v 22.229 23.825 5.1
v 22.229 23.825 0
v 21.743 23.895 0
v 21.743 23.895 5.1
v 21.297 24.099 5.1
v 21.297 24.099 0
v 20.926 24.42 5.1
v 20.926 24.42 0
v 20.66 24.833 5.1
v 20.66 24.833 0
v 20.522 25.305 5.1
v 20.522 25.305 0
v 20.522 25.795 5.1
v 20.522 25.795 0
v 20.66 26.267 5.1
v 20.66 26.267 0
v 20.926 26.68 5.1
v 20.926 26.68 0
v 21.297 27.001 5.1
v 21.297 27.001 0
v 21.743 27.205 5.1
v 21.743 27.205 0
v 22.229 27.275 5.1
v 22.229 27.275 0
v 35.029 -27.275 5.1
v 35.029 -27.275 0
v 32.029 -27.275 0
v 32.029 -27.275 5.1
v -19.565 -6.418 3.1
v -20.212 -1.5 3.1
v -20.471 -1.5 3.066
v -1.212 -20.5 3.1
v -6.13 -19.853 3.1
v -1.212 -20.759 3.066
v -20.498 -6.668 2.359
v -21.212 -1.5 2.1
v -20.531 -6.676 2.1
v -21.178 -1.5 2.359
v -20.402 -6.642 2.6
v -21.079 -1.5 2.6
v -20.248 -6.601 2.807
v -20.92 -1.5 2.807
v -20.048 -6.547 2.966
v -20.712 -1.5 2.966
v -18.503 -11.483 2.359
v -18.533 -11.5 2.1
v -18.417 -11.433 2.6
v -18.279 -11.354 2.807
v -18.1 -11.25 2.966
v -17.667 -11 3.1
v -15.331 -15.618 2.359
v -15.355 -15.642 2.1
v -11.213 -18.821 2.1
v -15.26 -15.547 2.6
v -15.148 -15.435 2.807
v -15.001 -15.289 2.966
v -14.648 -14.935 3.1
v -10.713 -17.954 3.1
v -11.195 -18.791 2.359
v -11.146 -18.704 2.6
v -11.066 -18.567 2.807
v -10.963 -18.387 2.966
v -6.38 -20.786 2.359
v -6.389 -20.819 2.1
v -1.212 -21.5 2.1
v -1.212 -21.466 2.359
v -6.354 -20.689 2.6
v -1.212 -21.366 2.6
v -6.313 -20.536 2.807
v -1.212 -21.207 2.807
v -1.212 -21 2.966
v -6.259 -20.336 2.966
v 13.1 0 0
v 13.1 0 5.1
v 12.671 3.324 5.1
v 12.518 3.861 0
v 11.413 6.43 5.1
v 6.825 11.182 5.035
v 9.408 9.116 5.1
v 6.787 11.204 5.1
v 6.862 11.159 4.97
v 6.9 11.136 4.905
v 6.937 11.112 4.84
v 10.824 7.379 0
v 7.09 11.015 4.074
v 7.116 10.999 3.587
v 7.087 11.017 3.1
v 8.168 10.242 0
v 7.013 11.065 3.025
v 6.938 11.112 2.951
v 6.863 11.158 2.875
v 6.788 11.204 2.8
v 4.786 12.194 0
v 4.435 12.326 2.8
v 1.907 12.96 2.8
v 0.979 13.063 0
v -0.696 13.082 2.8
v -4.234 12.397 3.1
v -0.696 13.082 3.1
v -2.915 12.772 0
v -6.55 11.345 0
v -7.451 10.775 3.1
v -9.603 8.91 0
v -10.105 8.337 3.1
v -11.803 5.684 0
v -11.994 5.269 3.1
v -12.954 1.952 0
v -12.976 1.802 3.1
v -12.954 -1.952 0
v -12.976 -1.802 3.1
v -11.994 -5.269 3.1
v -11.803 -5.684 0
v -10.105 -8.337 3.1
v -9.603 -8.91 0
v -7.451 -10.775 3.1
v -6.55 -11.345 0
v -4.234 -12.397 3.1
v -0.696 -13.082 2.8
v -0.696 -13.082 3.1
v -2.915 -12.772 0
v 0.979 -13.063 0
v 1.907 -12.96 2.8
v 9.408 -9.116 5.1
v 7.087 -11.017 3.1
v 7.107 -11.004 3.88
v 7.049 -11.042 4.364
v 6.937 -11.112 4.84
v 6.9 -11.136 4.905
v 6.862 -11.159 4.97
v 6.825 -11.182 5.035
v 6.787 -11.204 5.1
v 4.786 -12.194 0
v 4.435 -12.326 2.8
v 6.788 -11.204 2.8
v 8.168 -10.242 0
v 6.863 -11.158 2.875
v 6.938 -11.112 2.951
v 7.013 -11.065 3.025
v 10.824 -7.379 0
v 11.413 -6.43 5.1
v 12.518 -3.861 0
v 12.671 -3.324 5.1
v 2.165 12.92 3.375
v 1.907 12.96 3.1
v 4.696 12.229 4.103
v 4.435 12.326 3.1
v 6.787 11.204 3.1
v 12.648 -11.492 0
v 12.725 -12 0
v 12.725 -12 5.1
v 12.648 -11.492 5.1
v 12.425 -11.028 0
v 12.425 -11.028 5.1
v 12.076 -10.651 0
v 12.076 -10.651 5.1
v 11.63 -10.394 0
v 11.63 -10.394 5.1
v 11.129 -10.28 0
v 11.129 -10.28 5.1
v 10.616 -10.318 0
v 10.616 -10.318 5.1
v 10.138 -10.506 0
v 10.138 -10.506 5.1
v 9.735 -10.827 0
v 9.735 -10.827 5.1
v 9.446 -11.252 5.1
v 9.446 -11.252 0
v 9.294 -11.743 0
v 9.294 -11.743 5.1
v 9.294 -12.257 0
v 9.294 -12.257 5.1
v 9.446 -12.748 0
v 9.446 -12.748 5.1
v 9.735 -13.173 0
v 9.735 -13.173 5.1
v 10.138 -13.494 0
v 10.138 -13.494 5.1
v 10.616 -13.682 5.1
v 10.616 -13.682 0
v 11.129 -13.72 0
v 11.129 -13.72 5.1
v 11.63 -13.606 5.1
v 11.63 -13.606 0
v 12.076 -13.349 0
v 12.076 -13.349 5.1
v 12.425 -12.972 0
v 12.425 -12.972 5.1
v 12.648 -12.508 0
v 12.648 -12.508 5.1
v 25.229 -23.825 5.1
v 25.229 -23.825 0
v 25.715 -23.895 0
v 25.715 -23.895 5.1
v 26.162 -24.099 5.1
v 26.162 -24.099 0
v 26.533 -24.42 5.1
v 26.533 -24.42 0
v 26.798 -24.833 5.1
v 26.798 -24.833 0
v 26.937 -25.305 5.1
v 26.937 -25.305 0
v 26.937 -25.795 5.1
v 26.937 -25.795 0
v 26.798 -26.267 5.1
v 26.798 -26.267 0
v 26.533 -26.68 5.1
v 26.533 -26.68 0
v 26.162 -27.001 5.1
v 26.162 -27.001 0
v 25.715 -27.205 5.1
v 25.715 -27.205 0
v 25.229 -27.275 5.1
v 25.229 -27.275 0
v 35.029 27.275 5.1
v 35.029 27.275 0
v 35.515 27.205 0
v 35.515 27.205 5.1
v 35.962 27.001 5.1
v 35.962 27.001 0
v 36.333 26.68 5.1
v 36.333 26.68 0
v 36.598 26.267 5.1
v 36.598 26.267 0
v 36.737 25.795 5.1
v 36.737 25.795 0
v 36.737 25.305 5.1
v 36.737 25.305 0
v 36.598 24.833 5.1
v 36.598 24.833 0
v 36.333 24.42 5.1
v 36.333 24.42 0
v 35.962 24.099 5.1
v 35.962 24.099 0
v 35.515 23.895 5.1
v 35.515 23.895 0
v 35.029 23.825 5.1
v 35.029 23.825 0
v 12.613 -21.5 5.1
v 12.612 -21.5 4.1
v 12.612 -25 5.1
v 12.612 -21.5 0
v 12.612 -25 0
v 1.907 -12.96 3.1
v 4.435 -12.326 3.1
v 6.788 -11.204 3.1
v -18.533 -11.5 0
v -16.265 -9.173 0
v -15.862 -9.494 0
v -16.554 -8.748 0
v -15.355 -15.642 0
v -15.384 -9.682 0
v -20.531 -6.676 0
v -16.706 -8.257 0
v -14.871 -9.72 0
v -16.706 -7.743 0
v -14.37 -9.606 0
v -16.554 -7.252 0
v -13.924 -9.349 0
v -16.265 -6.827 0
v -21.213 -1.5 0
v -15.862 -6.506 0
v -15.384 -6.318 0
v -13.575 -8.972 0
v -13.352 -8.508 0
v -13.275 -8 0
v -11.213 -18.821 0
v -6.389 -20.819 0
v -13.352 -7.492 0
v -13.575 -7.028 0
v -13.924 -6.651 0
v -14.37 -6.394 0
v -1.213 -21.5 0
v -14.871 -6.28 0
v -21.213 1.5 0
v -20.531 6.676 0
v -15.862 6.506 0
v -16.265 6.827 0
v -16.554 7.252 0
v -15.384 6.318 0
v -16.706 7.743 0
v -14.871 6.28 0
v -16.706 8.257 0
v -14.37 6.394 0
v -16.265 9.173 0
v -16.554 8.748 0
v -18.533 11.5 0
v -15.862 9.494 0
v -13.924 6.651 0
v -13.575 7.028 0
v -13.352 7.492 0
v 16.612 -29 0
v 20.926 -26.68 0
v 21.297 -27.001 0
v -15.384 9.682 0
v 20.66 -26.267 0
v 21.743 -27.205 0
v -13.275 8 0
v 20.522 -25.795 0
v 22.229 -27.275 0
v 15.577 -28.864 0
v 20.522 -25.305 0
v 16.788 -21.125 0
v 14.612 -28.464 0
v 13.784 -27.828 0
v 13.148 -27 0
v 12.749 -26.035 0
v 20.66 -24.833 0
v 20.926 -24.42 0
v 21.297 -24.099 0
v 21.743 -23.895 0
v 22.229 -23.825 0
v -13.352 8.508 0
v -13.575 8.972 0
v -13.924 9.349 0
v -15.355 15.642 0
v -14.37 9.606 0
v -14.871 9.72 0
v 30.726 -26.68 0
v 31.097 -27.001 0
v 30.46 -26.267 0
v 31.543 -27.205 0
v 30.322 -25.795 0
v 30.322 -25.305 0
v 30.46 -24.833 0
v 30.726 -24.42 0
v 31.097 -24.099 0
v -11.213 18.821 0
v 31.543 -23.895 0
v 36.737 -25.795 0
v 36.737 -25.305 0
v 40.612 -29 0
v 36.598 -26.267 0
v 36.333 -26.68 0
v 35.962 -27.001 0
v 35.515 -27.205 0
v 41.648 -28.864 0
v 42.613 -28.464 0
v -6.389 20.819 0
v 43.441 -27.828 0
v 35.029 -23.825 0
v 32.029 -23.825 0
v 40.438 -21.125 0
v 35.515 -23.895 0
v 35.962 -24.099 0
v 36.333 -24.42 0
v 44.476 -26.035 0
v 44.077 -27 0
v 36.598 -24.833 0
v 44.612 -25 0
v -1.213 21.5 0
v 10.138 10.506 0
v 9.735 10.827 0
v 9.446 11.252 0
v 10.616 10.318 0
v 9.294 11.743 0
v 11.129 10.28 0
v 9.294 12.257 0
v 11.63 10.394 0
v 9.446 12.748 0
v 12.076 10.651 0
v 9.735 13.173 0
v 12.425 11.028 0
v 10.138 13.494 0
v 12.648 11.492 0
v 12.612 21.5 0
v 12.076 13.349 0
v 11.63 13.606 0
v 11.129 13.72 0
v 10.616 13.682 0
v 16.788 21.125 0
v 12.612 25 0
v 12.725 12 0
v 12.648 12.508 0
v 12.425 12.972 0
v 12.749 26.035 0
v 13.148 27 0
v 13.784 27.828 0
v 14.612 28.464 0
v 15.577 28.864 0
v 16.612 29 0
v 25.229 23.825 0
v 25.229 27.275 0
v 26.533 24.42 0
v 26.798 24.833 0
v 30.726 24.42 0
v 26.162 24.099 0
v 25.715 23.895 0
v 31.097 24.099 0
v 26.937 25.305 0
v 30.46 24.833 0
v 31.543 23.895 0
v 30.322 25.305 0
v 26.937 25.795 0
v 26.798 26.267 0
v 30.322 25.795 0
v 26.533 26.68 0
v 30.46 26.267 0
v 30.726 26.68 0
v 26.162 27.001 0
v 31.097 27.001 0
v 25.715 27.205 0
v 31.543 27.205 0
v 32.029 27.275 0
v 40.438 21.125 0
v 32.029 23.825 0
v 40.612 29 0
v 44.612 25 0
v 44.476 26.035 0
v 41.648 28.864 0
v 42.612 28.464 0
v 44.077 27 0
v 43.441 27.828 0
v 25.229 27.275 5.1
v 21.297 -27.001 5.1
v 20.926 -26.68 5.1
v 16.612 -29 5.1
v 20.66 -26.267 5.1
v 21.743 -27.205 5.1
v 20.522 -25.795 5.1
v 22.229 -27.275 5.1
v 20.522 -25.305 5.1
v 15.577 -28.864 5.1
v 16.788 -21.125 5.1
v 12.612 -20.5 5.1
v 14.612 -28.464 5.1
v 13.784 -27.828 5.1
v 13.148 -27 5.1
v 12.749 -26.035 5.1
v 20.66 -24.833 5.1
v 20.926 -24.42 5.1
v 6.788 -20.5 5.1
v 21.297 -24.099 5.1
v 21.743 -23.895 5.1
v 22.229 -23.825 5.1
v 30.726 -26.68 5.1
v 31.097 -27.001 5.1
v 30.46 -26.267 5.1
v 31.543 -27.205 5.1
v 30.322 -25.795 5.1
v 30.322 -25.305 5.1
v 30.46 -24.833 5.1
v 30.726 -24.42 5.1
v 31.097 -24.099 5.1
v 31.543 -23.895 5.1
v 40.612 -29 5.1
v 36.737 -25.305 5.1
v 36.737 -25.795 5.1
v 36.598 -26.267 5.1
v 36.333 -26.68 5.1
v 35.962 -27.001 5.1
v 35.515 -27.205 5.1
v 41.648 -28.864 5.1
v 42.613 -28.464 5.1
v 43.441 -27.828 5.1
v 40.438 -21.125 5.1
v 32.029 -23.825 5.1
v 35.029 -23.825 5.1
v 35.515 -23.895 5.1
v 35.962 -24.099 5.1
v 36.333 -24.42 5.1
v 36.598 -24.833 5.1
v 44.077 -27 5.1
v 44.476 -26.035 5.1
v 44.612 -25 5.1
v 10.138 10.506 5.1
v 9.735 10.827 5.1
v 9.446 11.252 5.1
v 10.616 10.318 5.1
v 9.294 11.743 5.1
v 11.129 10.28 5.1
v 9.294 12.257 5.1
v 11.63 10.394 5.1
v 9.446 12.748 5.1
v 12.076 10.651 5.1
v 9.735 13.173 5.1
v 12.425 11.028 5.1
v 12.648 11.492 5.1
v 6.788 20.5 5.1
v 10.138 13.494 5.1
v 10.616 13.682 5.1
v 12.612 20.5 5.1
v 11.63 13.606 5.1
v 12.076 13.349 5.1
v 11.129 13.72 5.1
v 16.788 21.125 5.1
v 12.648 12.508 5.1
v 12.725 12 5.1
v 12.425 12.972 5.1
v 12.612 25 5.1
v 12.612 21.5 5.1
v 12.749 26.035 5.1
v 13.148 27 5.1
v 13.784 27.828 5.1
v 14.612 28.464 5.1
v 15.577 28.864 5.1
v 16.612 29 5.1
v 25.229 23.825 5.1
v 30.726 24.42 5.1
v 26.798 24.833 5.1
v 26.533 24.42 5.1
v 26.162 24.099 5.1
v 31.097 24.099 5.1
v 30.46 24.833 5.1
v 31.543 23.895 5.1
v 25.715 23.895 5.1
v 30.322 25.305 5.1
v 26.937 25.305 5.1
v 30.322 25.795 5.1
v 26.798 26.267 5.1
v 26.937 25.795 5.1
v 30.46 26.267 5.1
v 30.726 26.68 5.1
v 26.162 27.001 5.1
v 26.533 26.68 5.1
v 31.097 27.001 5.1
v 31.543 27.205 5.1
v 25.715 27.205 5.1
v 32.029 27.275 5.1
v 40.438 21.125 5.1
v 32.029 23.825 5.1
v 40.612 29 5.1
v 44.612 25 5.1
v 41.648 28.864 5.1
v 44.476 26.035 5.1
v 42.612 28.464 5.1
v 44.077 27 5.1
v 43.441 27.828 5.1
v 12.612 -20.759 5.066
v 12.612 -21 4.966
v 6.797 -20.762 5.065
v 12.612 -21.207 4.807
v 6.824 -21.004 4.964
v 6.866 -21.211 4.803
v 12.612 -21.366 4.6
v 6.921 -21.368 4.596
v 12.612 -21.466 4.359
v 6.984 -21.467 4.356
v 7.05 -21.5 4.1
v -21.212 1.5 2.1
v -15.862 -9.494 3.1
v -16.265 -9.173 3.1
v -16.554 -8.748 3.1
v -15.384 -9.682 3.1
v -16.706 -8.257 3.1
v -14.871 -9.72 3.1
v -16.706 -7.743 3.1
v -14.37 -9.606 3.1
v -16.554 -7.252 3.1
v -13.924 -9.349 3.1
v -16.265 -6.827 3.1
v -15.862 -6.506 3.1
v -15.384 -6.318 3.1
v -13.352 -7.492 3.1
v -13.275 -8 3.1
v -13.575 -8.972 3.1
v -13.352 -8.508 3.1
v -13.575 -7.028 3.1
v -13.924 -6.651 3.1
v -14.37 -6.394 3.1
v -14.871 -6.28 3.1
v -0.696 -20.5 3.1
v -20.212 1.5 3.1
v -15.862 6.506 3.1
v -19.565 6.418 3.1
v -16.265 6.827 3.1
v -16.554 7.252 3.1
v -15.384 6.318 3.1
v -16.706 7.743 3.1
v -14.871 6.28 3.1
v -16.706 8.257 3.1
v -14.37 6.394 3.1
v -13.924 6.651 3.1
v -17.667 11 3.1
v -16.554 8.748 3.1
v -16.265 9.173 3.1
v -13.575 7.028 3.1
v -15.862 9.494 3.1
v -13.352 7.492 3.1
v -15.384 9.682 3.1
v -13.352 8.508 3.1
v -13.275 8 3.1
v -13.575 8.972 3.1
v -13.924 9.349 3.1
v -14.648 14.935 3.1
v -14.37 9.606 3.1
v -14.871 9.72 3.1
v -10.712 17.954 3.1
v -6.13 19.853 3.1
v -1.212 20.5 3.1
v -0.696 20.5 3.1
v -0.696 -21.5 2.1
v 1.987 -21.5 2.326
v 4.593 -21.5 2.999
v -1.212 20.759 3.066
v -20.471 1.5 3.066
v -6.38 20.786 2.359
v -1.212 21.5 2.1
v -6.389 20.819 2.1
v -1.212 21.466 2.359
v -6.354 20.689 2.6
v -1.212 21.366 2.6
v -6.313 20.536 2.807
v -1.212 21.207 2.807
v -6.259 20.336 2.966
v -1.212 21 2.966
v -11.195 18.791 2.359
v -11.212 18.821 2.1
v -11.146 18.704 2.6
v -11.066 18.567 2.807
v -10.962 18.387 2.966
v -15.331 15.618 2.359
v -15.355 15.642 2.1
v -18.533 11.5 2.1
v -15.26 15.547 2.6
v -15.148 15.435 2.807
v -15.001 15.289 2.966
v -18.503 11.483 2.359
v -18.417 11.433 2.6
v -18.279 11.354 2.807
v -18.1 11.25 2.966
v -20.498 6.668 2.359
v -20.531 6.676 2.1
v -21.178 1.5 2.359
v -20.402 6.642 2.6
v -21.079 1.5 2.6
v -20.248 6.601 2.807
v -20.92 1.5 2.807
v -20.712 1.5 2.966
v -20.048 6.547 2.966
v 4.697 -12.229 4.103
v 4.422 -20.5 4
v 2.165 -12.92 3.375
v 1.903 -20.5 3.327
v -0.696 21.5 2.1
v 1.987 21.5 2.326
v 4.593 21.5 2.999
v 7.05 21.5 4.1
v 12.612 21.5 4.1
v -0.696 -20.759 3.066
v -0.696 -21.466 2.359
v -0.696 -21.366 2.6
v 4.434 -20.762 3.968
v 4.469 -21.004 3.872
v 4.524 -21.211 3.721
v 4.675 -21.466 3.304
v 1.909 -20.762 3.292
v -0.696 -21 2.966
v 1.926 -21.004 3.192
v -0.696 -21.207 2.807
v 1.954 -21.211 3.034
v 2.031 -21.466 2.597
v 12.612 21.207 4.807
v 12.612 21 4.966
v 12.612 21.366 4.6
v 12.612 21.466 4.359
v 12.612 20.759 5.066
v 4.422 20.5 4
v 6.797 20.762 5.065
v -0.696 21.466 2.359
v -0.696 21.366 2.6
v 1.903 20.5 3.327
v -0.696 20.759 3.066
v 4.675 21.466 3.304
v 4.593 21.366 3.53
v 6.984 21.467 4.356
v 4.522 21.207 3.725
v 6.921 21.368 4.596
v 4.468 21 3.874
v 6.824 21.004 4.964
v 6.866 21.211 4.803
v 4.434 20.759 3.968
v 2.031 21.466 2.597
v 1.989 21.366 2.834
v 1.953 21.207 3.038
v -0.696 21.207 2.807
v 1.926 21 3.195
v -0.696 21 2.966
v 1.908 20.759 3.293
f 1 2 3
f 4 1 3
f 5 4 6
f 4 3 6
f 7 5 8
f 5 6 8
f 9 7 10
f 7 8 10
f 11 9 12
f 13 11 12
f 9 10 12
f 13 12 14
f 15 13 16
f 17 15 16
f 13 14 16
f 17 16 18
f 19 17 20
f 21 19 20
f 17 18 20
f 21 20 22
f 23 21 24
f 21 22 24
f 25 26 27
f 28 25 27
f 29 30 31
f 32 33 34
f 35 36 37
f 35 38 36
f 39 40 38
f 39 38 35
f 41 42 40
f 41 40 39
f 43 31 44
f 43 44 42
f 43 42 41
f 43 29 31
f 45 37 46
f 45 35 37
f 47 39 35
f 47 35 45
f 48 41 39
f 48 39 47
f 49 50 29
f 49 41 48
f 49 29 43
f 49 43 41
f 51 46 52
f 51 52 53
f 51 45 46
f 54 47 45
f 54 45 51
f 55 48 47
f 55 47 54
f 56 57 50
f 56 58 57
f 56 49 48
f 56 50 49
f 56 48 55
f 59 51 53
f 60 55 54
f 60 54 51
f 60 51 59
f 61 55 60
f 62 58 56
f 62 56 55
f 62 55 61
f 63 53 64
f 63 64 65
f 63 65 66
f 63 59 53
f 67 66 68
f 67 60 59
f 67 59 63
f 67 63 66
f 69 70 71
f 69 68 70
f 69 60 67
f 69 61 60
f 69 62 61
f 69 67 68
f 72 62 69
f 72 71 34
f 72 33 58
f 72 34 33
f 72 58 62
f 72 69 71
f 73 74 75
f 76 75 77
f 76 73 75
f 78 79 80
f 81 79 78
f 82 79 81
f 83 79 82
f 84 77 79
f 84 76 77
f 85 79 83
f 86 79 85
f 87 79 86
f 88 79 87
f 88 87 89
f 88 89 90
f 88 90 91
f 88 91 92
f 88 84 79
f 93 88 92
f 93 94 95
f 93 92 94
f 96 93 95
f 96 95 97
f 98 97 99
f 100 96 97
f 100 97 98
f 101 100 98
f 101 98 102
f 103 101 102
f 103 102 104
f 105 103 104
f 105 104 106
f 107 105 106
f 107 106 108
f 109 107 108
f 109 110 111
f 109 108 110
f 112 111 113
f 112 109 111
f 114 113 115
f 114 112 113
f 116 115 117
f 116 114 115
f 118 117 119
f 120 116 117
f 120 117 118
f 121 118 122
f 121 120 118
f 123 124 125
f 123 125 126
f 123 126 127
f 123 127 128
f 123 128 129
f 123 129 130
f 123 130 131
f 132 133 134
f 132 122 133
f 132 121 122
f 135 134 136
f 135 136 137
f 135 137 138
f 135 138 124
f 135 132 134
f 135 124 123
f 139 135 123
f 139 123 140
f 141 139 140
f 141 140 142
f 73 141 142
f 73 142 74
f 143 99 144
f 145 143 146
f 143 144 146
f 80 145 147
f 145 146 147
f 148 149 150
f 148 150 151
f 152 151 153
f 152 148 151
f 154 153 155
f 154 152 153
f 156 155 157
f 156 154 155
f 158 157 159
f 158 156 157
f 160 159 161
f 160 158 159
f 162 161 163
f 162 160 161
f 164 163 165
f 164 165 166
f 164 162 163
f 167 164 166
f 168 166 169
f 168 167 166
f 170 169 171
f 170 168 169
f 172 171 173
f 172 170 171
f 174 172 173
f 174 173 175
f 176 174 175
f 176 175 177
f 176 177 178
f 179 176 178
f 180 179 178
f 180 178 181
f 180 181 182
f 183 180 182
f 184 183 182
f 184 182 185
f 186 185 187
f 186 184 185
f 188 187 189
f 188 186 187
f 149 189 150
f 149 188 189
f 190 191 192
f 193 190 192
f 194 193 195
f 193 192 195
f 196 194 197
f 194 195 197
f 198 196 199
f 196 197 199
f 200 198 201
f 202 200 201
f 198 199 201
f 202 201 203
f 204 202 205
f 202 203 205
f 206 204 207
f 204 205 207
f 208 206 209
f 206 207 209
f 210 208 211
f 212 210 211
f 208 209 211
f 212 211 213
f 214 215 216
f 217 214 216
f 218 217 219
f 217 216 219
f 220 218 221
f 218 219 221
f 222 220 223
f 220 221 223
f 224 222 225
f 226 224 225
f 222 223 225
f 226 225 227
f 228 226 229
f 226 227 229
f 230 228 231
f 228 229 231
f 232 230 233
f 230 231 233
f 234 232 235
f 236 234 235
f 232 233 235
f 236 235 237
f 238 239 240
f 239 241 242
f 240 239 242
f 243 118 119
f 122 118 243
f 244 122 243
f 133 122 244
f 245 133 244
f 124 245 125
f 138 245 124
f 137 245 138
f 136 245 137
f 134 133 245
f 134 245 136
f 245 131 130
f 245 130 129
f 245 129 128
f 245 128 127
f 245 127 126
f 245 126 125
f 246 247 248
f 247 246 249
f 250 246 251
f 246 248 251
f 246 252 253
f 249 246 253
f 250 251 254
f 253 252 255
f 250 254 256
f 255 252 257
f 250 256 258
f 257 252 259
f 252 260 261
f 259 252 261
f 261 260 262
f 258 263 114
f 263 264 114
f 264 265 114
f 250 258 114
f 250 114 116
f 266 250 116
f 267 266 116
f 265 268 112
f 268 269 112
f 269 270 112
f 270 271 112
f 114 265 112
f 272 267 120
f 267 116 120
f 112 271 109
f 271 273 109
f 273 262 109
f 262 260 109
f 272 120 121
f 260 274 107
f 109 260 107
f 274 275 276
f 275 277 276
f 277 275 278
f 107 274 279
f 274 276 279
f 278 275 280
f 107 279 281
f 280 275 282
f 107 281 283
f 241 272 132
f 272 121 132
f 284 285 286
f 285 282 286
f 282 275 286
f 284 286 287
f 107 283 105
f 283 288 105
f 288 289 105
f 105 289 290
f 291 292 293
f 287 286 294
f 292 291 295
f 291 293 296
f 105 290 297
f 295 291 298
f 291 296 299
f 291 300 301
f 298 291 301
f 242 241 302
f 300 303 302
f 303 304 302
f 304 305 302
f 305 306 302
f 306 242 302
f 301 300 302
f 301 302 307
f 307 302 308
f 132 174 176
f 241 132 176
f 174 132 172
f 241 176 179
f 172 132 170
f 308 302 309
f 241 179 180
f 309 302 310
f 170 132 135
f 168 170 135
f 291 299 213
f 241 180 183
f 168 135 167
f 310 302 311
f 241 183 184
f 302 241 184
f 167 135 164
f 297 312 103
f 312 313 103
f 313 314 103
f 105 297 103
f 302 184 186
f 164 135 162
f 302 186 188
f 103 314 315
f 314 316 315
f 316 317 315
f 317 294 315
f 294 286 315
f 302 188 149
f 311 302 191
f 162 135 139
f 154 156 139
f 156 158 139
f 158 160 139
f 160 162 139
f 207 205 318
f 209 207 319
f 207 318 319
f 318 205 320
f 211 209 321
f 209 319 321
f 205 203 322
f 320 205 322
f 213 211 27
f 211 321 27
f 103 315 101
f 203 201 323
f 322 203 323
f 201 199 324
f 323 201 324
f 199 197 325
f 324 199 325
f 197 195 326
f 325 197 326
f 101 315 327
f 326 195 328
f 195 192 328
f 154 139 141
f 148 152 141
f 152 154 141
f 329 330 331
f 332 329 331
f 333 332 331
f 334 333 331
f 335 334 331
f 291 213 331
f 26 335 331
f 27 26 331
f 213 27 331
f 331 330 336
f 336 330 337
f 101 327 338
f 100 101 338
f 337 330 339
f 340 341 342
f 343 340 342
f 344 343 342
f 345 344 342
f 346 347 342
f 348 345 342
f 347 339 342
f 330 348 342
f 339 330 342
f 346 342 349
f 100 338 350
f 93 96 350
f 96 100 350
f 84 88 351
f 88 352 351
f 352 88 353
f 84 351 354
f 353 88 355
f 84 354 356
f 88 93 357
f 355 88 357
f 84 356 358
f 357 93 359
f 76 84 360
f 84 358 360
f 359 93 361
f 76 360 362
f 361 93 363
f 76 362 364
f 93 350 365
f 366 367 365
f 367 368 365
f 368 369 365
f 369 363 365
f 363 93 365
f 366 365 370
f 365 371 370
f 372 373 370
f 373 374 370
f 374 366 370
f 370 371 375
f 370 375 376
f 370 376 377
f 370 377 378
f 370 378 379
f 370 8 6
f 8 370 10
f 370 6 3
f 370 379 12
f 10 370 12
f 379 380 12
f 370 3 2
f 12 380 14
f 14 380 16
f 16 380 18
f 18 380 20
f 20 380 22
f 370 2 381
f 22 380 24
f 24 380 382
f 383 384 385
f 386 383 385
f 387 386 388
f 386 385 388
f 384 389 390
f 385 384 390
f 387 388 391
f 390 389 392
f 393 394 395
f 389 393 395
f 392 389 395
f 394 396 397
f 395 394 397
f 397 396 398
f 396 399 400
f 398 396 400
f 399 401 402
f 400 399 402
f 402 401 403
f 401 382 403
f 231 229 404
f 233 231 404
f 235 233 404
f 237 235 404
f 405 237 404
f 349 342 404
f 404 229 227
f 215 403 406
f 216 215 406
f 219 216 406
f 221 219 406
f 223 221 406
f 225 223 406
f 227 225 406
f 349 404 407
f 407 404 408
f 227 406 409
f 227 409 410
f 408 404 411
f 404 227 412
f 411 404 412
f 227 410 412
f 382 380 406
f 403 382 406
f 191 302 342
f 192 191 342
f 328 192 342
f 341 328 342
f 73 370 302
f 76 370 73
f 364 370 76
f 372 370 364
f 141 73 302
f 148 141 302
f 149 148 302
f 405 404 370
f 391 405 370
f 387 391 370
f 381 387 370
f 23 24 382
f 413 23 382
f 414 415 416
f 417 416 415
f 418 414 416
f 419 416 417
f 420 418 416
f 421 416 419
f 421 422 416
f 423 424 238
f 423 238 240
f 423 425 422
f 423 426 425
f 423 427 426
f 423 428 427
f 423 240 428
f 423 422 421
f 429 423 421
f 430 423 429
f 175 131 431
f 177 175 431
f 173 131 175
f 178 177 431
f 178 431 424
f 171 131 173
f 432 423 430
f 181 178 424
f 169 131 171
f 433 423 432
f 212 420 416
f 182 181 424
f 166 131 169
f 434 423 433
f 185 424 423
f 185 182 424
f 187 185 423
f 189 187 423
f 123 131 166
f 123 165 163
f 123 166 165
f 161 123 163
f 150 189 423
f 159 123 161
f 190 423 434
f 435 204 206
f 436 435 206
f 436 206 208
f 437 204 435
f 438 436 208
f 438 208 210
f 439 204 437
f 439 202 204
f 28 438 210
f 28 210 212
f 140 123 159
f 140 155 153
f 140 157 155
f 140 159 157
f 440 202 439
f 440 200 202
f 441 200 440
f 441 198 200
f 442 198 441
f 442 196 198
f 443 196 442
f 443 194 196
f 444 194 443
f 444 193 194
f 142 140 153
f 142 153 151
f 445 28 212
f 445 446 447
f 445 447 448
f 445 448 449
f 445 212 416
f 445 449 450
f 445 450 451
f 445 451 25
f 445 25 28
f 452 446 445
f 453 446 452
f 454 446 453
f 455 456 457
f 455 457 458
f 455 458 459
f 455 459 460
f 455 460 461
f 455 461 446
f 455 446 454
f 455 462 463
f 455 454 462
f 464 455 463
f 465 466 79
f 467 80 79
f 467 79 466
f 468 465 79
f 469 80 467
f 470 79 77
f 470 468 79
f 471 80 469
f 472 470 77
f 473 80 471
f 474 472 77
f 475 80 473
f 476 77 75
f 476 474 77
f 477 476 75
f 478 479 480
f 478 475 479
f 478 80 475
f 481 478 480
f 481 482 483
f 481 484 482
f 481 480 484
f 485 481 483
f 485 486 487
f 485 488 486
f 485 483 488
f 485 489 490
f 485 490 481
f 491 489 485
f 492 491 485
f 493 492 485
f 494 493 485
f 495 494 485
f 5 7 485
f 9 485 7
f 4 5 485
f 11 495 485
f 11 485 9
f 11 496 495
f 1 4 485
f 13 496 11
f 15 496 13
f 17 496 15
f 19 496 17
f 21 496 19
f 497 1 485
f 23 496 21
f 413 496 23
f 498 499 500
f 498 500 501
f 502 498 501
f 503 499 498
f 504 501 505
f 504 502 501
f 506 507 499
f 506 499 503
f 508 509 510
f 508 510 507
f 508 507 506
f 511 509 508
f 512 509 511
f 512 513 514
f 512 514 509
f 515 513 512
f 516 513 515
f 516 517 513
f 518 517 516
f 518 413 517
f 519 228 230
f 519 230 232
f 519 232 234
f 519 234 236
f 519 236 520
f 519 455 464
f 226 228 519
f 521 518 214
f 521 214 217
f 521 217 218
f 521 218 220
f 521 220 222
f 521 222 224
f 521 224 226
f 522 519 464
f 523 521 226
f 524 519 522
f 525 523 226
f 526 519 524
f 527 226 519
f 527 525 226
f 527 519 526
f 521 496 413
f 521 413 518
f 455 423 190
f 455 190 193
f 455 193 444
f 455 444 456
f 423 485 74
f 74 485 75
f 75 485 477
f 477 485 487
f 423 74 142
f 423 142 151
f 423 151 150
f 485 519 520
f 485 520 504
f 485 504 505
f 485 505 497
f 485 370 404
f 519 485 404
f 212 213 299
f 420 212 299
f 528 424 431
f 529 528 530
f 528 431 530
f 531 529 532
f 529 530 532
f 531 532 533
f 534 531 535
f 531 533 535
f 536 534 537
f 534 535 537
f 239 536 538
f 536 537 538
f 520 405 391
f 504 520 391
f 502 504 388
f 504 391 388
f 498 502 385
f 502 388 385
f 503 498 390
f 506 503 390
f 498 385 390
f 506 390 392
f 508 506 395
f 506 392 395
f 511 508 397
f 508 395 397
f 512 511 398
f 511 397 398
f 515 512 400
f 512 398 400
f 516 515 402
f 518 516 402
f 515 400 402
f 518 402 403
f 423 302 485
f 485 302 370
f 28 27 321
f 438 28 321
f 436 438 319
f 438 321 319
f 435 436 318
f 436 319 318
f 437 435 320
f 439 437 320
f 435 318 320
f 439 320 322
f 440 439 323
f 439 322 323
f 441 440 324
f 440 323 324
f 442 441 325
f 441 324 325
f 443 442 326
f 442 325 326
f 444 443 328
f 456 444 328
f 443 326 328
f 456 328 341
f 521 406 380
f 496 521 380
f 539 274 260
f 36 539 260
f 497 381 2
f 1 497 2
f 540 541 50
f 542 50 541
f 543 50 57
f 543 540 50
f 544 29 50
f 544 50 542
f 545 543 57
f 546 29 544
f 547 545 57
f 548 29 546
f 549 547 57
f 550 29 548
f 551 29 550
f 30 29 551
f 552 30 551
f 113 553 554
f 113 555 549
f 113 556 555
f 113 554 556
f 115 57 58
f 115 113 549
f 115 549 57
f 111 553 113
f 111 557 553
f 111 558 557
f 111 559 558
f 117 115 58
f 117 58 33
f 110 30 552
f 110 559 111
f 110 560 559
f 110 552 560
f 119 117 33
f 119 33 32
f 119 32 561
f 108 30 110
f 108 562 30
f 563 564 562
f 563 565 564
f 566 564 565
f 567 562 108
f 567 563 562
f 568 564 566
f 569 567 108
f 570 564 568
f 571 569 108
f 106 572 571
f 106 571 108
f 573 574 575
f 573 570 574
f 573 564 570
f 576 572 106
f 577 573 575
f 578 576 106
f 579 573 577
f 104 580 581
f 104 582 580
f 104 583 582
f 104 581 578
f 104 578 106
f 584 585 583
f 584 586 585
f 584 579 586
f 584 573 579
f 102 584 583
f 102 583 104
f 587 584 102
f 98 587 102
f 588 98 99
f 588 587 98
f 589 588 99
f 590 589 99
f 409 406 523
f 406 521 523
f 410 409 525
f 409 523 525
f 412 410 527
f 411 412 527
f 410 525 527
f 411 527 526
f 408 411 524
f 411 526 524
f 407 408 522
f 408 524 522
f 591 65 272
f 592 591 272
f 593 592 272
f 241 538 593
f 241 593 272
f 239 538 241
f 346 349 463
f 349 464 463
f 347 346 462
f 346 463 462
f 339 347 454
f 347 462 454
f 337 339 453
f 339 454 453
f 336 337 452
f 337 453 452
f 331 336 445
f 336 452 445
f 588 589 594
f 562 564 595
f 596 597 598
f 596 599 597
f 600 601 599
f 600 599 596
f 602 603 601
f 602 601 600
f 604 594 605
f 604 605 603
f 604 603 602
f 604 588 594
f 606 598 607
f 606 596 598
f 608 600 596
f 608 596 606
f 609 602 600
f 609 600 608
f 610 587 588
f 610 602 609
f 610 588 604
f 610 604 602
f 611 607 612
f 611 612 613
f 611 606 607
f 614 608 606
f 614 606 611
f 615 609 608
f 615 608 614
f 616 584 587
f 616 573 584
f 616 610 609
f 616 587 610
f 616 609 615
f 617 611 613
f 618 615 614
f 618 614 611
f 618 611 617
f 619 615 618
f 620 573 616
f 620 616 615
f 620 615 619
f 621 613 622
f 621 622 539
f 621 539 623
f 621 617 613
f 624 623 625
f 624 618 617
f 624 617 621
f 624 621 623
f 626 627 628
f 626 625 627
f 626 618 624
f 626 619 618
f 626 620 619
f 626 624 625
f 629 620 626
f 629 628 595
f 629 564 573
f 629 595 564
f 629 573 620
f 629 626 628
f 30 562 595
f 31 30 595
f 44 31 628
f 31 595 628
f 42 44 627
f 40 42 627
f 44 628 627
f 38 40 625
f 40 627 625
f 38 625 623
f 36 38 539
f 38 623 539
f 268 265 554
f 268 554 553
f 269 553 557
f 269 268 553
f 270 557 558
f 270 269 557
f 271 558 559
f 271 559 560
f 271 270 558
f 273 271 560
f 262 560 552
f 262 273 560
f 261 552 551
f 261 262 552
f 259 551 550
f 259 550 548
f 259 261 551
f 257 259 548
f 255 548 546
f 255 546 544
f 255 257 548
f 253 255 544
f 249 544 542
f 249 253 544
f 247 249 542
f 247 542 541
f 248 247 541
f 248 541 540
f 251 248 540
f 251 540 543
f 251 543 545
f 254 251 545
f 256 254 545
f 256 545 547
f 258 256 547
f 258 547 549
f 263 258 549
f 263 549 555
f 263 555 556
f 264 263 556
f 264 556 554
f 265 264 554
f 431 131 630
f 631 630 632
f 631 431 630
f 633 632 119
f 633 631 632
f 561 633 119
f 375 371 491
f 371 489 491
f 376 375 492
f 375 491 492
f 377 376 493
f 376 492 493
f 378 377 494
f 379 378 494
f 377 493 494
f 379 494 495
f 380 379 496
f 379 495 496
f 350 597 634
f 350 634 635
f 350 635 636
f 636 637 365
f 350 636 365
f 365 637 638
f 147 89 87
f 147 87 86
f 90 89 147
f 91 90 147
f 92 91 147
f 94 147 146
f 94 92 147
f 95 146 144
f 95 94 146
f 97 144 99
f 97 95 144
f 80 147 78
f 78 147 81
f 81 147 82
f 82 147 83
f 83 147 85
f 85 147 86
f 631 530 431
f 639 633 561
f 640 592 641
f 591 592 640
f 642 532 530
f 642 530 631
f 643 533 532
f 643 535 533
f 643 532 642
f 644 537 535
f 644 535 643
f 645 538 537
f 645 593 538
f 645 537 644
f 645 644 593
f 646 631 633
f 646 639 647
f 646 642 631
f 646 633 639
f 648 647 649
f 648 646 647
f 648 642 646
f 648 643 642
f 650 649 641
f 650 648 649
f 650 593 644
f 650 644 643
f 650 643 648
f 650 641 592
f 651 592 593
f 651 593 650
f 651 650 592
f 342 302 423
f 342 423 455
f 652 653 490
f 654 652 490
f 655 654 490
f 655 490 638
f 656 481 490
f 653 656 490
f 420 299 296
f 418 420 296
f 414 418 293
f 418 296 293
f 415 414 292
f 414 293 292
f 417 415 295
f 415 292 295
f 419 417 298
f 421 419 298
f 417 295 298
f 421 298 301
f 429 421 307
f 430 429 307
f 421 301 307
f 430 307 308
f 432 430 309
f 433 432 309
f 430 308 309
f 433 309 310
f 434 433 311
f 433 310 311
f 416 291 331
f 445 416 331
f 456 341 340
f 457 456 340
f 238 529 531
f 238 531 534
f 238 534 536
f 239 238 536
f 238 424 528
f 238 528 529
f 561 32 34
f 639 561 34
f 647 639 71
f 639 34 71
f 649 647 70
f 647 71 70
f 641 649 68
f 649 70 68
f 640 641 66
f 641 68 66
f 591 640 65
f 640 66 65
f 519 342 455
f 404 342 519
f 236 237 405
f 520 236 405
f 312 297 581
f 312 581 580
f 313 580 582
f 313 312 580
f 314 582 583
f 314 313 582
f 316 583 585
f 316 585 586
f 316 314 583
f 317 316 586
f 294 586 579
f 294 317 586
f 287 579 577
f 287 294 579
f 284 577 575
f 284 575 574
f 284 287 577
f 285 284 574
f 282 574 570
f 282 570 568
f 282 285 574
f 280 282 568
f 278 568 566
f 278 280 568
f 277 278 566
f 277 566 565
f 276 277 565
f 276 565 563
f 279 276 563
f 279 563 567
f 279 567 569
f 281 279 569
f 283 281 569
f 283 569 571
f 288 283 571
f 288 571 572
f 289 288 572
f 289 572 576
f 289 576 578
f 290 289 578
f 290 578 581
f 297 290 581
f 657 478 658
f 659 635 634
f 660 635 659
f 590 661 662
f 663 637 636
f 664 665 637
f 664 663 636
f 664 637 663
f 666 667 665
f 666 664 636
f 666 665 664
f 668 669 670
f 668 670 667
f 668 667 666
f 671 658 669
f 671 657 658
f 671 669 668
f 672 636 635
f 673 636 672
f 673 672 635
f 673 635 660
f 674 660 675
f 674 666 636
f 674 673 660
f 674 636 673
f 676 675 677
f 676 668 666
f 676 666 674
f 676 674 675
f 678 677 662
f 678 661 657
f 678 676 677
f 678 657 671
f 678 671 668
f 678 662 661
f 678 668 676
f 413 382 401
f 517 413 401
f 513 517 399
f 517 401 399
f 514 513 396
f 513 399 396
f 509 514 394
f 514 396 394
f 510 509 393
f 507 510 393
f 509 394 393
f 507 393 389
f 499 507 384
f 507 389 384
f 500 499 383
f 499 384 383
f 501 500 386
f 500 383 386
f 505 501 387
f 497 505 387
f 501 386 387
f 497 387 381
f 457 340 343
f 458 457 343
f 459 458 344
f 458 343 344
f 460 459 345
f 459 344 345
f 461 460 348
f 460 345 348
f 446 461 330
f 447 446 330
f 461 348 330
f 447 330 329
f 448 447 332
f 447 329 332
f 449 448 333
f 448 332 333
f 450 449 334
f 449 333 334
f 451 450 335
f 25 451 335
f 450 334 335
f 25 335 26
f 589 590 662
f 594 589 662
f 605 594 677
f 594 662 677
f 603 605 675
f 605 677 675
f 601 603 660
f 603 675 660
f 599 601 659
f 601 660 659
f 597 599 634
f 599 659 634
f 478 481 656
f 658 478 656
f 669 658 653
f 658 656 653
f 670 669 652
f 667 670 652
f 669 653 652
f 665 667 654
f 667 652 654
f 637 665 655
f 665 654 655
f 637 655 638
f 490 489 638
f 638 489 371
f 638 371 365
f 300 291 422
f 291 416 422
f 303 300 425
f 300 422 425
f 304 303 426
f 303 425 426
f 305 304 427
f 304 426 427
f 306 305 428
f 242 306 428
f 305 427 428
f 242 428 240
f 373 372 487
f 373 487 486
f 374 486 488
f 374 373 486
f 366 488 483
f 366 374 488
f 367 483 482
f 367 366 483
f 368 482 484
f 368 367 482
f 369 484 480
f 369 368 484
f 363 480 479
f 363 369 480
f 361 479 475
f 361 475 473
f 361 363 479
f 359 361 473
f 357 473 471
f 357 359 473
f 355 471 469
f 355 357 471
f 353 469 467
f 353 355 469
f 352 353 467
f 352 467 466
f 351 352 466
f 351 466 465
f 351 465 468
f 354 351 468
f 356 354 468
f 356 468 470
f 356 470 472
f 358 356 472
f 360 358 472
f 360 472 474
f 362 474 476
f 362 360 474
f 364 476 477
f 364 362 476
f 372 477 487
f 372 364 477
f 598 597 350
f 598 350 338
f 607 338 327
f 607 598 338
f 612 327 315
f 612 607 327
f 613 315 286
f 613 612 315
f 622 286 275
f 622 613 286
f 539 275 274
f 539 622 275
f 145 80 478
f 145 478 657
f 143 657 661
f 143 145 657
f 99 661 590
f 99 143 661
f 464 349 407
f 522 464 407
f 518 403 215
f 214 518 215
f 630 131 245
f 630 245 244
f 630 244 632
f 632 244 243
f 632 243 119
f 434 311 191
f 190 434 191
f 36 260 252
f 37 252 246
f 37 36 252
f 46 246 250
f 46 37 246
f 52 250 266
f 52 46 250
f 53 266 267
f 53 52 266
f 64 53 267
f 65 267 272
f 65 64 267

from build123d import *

# Parameters (mm, degrees)
SKETCH1_R           = 1.725
SKETCH1_R_2         = 13.1
SKETCH1_W           = 23.65
SKETCH1_H           = 42.25
BOSS_EXTRUDE1_DEPTH = 5.1
CUT_EXTRUDE1_START  = -2
SKETCH2_R           = 1.725
CUT_EXTRUDE1_DEPTH  = 2
FILLET1_R           = 4
FILLET2_R           = 20
FILLET3_R           = 15
FILLET4_R           = 1


with BuildPart() as part:
    # Sketch1 → Boss-Extrude1 (new body)
    with BuildSketch(Plane.XY):
        Polygon((12.6125, 29), (12.6125, 21.5), (-21.2125, 21.5), (-21.2125, -21.5), (12.6125, -21.5), (12.6125, -29), (44.6125, -29), (44.6125, 29), align=None)
        with Locations((-15, -8)):
            Circle(SKETCH1_R, mode=Mode.SUBTRACT)
        with Locations((-15, 8)):
            Circle(SKETCH1_R, mode=Mode.SUBTRACT)
        with Locations((11, 12)):
            Circle(SKETCH1_R, mode=Mode.SUBTRACT)
        with Locations((11, -12)):
            Circle(SKETCH1_R, mode=Mode.SUBTRACT)
        Circle(SKETCH1_R_2, mode=Mode.SUBTRACT)
        with BuildLine():
            Line((22.229319933, 27.275), (25.229319933, 27.275))
            ThreePointArc((25.229319933, 27.275), (26.954319933, 25.55), (25.229319933, 23.825))
            Line((25.229319933, 23.825), (22.229319933, 23.825))
            ThreePointArc((22.229319933, 23.825), (20.504319933, 25.55), (22.229319933, 27.275))
        make_face(mode=Mode.SUBTRACT)
        with BuildLine():
            Line((32.029319933, 27.275), (35.029319933, 27.275))
            ThreePointArc((35.029319933, 27.275), (36.754319933, 25.55), (35.029319933, 23.825))
            Line((35.029319933, 23.825), (32.029319933, 23.825))
            ThreePointArc((32.029319933, 23.825), (30.304319933, 25.55), (32.029319933, 27.275))
        make_face(mode=Mode.SUBTRACT)
        with BuildLine():
            Line((22.229319933, -23.825), (25.229319933, -23.825))
            ThreePointArc((25.229319933, -23.825), (26.954319933, -25.55), (25.229319933, -27.275))
            Line((25.229319933, -27.275), (22.229319933, -27.275))
            ThreePointArc((22.229319933, -27.275), (20.504319933, -25.55), (22.229319933, -23.825))
        make_face(mode=Mode.SUBTRACT)
        with BuildLine():
            Line((32.029319933, -23.825), (35.029319933, -23.825))
            ThreePointArc((35.029319933, -23.825), (36.754319933, -25.55), (35.029319933, -27.275))
            Line((35.029319933, -27.275), (32.029319933, -27.275))
            ThreePointArc((32.029319933, -27.275), (30.304319933, -25.55), (32.029319933, -23.825))
        make_face(mode=Mode.SUBTRACT)
        with Locations((28.6125, 0)):
            Rectangle(SKETCH1_W, SKETCH1_H, mode=Mode.SUBTRACT)
    extrude(amount=BOSS_EXTRUDE1_DEPTH)

    # Sketch2 → Cut-Extrude1 (cut)
    with BuildSketch(Plane.XY.offset(5.1).offset(CUT_EXTRUDE1_START)):
        with BuildLine():
            Line((6.7875, 11.204456424), (6.7875, 21.5))
            Line((6.7875, 21.5), (-21.2125, 21.5))
            Line((-21.2125, 21.5), (-21.2125, -21.5))
            Line((-21.2125, -21.5), (6.7875, -21.5))
            Line((6.7875, -21.5), (6.7875, -11.204456424))
            ThreePointArc((6.7875, -11.204456424), (-13.1, 0), (6.7875, 11.204456424))
        make_face()
        with Locations((-15, -8)):
            Circle(SKETCH2_R, mode=Mode.SUBTRACT)
        with Locations((-15, 8)):
            Circle(SKETCH2_R, mode=Mode.SUBTRACT)
    extrude(amount=CUT_EXTRUDE1_DEPTH, mode=Mode.SUBTRACT)

    # Fillet1
    fillet1_edges = [part.edges().sort_by_distance(p)[0] for p in [
        (12.6125, 29, 2.55),
        (44.6125, 29, 2.55),
        (44.6125, -29, 2.55),
        (12.6125, -29, 2.55),
    ]]
    fillet(fillet1_edges, radius=FILLET1_R)

    # Fillet2
    fillet2_edges = [part.edges().sort_by_distance(p)[0] for p in [
        (-21.2125, -21.5, 1.55),
        (-21.2125, 21.5, 1.55),
    ]]
    fillet(fillet2_edges, radius=FILLET2_R)

    # Fillet3
    # the kernel refuses this fillet: 15 mm, written as the material it adds along each edge
    with BuildSketch(Plane(origin=(6.7875, -21.5, 3.1), x_dir=(-1, 0, 0), z_dir=(0, 1, 0))) as fillet3_piece_1_section:
        with BuildLine():
            CenterArc((7.483314774, 15), FILLET3_R, 240.073565133, 29.926434867)
            Line((0, 2), (-0.149666295, 1.74))
            ThreePointArc((-0.149666295, 1.74), (-0.3, 1), (-0.3, 0))
            Line((-0.3, 0), (0, -0.3))
            Line((0, -0.3), (7.483314774, -0.3))
            Line((7.483314774, -0.3), (7.483314774, 0))
        make_face()
    fillet3_piece_1 = extrude(amount=29.00383051, mode=Mode.PRIVATE)
    fillet3_piece_1 = fillet3_piece_1 - Plane(origin=(0, 0, 3.507090061), x_dir=(1, 0, 0), z_dir=(0, 0, -1)) * Cylinder(13.1, 88, mode=Mode.PRIVATE)
    add(fillet3_piece_1)
    with BuildSketch(Plane(origin=(6.7875, -7.50383051, 3.1), x_dir=(-1, 0, 0), z_dir=(0, 1, 0))) as fillet3_piece_2_section:
        with BuildLine():
            CenterArc((7.483314774, 15), FILLET3_R, 240.073565133, 29.926434867)
            Line((0, 2), (-0.149666295, 1.74))
            ThreePointArc((-0.149666295, 1.74), (-0.3, 1), (-0.3, 0))
            Line((-0.3, 0), (0, -0.3))
            Line((0, -0.3), (7.483314774, -0.3))
            Line((7.483314774, -0.3), (7.483314774, 0))
        make_face()
    fillet3_piece_2 = extrude(amount=29.00383051, mode=Mode.PRIVATE)
    fillet3_piece_2 = fillet3_piece_2 - Plane(origin=(0, 0, 3.507090028), x_dir=(1, 0, 0), z_dir=(0, 0, -1)) * Cylinder(13.1, 88, mode=Mode.PRIVATE)
    add(fillet3_piece_2)

    # Fillet4
    # the kernel refuses this fillet: 1 mm, written as the material it takes off along each edge
    with BuildSketch(Plane(origin=(4.2875, -21.5, 5.1), x_dir=(0, 1, 0), z_dir=(1, 0, 0)), Plane(origin=(12.6125, 21.5, 5.1), x_dir=(0, -1, 0), z_dir=(-1, 0, 0))) as fillet4_piece_1:
        with BuildLine():
            CenterArc((FILLET4_R, -FILLET4_R), FILLET4_R, 90, 90)
            Line((0, -FILLET4_R), (0, 0))
            Line((0, 0), (FILLET4_R, 0))
        make_face()
    extrude(amount=8.325, mode=Mode.SUBTRACT)
    with BuildSketch(Plane(origin=(-1.2125, -21.5, 3.1), x_dir=(0, 1, 0), z_dir=(1, 0, 0)), Plane(origin=(-0.695814774, 21.5, 3.1), x_dir=(0, -1, 0), z_dir=(-1, 0, 0))) as fillet4_piece_2:
        with BuildLine():
            CenterArc((FILLET4_R, -FILLET4_R), FILLET4_R, 90, 90)
            Line((0, -FILLET4_R), (0, 0))
            Line((0, 0), (FILLET4_R, 0))
        make_face()
    extrude(amount=0.516685226, mode=Mode.SUBTRACT)
    with BuildSketch(Plane(origin=(-21.2125, 1.5, 3.1), x_dir=(1, 0, 0), z_dir=(0, -1, 0))) as fillet4_piece_3:
        with BuildLine():
            CenterArc((FILLET4_R, -FILLET4_R), FILLET4_R, 90, 90)
            Line((0, -FILLET4_R), (0, 0))
            Line((0, 0), (FILLET4_R, 0))
        make_face()
    extrude(amount=3, mode=Mode.SUBTRACT)
    with BuildSketch(Plane(origin=(-1.2125, 1.5, 3.1), x_dir=(0, 1, 0), z_dir=(1, 0, 0))) as fillet4_piece_4:
        with BuildLine():
            CenterArc((20 - FILLET4_R, -FILLET4_R), FILLET4_R, 0, 90)
            Line((20, -FILLET4_R), (20, 0))
            Line((20, 0), (20 - FILLET4_R, 0))
        make_face()
    revolve(axis=Axis((-1.2125, 1.5, 3.1), (0, 0, 1)), revolution_arc=90, mode=Mode.SUBTRACT)
    with BuildSketch(Plane(origin=(-1.2125, -1.5, 3.1), x_dir=(-1, 0, 0), z_dir=(0, 1, 0))) as fillet4_piece_5:
        with BuildLine():
            CenterArc((20 - FILLET4_R, -FILLET4_R), FILLET4_R, 0, 90)
            Line((20, -FILLET4_R), (20, 0))
            Line((20, 0), (20 - FILLET4_R, 0))
        make_face()
    revolve(axis=Axis((-1.2125, -1.5, 3.1), (0, 0, 1)), revolution_arc=90, mode=Mode.SUBTRACT)
    with BuildSketch(Plane(origin=(-0.695814774, -21.5, 18.1), x_dir=(0.6357570418169636, 0, -0.7718892302527245), z_dir=(0.7718892302527245, 0, 0.6357570418169636))) as fillet4_piece_6:
        with BuildLine():
            CenterArc((15 + FILLET4_R, FILLET4_R), FILLET4_R, 180, 90)
            Line((15 + FILLET4_R, 0), (15, 0))
            Line((15, 0), (15, FILLET4_R))
        make_face()
    revolve(axis=Axis((-0.695814774, -21.5, 18.1), (0, 1, 0)), revolution_arc=39.476155484, mode=Mode.SUBTRACT)
    with BuildSketch(Plane(origin=(-0.695814774, 21.5, 18.1), x_dir=(0.6357570418169636, 0, -0.7718892302527245), z_dir=(0.7718892302527245, 0, 0.6357570418169636))) as fillet4_piece_7:
        with BuildLine():
            CenterArc((15 + FILLET4_R, -FILLET4_R), FILLET4_R, 90, 90)
            Line((15 + FILLET4_R, 0), (15, 0))
            Line((15, 0), (15, -FILLET4_R))
        make_face()
    revolve(axis=Axis((-0.695814774, 21.5, 18.1), (0, 1, 0)), revolution_arc=39.476155484, mode=Mode.SUBTRACT)


solid = part.part
